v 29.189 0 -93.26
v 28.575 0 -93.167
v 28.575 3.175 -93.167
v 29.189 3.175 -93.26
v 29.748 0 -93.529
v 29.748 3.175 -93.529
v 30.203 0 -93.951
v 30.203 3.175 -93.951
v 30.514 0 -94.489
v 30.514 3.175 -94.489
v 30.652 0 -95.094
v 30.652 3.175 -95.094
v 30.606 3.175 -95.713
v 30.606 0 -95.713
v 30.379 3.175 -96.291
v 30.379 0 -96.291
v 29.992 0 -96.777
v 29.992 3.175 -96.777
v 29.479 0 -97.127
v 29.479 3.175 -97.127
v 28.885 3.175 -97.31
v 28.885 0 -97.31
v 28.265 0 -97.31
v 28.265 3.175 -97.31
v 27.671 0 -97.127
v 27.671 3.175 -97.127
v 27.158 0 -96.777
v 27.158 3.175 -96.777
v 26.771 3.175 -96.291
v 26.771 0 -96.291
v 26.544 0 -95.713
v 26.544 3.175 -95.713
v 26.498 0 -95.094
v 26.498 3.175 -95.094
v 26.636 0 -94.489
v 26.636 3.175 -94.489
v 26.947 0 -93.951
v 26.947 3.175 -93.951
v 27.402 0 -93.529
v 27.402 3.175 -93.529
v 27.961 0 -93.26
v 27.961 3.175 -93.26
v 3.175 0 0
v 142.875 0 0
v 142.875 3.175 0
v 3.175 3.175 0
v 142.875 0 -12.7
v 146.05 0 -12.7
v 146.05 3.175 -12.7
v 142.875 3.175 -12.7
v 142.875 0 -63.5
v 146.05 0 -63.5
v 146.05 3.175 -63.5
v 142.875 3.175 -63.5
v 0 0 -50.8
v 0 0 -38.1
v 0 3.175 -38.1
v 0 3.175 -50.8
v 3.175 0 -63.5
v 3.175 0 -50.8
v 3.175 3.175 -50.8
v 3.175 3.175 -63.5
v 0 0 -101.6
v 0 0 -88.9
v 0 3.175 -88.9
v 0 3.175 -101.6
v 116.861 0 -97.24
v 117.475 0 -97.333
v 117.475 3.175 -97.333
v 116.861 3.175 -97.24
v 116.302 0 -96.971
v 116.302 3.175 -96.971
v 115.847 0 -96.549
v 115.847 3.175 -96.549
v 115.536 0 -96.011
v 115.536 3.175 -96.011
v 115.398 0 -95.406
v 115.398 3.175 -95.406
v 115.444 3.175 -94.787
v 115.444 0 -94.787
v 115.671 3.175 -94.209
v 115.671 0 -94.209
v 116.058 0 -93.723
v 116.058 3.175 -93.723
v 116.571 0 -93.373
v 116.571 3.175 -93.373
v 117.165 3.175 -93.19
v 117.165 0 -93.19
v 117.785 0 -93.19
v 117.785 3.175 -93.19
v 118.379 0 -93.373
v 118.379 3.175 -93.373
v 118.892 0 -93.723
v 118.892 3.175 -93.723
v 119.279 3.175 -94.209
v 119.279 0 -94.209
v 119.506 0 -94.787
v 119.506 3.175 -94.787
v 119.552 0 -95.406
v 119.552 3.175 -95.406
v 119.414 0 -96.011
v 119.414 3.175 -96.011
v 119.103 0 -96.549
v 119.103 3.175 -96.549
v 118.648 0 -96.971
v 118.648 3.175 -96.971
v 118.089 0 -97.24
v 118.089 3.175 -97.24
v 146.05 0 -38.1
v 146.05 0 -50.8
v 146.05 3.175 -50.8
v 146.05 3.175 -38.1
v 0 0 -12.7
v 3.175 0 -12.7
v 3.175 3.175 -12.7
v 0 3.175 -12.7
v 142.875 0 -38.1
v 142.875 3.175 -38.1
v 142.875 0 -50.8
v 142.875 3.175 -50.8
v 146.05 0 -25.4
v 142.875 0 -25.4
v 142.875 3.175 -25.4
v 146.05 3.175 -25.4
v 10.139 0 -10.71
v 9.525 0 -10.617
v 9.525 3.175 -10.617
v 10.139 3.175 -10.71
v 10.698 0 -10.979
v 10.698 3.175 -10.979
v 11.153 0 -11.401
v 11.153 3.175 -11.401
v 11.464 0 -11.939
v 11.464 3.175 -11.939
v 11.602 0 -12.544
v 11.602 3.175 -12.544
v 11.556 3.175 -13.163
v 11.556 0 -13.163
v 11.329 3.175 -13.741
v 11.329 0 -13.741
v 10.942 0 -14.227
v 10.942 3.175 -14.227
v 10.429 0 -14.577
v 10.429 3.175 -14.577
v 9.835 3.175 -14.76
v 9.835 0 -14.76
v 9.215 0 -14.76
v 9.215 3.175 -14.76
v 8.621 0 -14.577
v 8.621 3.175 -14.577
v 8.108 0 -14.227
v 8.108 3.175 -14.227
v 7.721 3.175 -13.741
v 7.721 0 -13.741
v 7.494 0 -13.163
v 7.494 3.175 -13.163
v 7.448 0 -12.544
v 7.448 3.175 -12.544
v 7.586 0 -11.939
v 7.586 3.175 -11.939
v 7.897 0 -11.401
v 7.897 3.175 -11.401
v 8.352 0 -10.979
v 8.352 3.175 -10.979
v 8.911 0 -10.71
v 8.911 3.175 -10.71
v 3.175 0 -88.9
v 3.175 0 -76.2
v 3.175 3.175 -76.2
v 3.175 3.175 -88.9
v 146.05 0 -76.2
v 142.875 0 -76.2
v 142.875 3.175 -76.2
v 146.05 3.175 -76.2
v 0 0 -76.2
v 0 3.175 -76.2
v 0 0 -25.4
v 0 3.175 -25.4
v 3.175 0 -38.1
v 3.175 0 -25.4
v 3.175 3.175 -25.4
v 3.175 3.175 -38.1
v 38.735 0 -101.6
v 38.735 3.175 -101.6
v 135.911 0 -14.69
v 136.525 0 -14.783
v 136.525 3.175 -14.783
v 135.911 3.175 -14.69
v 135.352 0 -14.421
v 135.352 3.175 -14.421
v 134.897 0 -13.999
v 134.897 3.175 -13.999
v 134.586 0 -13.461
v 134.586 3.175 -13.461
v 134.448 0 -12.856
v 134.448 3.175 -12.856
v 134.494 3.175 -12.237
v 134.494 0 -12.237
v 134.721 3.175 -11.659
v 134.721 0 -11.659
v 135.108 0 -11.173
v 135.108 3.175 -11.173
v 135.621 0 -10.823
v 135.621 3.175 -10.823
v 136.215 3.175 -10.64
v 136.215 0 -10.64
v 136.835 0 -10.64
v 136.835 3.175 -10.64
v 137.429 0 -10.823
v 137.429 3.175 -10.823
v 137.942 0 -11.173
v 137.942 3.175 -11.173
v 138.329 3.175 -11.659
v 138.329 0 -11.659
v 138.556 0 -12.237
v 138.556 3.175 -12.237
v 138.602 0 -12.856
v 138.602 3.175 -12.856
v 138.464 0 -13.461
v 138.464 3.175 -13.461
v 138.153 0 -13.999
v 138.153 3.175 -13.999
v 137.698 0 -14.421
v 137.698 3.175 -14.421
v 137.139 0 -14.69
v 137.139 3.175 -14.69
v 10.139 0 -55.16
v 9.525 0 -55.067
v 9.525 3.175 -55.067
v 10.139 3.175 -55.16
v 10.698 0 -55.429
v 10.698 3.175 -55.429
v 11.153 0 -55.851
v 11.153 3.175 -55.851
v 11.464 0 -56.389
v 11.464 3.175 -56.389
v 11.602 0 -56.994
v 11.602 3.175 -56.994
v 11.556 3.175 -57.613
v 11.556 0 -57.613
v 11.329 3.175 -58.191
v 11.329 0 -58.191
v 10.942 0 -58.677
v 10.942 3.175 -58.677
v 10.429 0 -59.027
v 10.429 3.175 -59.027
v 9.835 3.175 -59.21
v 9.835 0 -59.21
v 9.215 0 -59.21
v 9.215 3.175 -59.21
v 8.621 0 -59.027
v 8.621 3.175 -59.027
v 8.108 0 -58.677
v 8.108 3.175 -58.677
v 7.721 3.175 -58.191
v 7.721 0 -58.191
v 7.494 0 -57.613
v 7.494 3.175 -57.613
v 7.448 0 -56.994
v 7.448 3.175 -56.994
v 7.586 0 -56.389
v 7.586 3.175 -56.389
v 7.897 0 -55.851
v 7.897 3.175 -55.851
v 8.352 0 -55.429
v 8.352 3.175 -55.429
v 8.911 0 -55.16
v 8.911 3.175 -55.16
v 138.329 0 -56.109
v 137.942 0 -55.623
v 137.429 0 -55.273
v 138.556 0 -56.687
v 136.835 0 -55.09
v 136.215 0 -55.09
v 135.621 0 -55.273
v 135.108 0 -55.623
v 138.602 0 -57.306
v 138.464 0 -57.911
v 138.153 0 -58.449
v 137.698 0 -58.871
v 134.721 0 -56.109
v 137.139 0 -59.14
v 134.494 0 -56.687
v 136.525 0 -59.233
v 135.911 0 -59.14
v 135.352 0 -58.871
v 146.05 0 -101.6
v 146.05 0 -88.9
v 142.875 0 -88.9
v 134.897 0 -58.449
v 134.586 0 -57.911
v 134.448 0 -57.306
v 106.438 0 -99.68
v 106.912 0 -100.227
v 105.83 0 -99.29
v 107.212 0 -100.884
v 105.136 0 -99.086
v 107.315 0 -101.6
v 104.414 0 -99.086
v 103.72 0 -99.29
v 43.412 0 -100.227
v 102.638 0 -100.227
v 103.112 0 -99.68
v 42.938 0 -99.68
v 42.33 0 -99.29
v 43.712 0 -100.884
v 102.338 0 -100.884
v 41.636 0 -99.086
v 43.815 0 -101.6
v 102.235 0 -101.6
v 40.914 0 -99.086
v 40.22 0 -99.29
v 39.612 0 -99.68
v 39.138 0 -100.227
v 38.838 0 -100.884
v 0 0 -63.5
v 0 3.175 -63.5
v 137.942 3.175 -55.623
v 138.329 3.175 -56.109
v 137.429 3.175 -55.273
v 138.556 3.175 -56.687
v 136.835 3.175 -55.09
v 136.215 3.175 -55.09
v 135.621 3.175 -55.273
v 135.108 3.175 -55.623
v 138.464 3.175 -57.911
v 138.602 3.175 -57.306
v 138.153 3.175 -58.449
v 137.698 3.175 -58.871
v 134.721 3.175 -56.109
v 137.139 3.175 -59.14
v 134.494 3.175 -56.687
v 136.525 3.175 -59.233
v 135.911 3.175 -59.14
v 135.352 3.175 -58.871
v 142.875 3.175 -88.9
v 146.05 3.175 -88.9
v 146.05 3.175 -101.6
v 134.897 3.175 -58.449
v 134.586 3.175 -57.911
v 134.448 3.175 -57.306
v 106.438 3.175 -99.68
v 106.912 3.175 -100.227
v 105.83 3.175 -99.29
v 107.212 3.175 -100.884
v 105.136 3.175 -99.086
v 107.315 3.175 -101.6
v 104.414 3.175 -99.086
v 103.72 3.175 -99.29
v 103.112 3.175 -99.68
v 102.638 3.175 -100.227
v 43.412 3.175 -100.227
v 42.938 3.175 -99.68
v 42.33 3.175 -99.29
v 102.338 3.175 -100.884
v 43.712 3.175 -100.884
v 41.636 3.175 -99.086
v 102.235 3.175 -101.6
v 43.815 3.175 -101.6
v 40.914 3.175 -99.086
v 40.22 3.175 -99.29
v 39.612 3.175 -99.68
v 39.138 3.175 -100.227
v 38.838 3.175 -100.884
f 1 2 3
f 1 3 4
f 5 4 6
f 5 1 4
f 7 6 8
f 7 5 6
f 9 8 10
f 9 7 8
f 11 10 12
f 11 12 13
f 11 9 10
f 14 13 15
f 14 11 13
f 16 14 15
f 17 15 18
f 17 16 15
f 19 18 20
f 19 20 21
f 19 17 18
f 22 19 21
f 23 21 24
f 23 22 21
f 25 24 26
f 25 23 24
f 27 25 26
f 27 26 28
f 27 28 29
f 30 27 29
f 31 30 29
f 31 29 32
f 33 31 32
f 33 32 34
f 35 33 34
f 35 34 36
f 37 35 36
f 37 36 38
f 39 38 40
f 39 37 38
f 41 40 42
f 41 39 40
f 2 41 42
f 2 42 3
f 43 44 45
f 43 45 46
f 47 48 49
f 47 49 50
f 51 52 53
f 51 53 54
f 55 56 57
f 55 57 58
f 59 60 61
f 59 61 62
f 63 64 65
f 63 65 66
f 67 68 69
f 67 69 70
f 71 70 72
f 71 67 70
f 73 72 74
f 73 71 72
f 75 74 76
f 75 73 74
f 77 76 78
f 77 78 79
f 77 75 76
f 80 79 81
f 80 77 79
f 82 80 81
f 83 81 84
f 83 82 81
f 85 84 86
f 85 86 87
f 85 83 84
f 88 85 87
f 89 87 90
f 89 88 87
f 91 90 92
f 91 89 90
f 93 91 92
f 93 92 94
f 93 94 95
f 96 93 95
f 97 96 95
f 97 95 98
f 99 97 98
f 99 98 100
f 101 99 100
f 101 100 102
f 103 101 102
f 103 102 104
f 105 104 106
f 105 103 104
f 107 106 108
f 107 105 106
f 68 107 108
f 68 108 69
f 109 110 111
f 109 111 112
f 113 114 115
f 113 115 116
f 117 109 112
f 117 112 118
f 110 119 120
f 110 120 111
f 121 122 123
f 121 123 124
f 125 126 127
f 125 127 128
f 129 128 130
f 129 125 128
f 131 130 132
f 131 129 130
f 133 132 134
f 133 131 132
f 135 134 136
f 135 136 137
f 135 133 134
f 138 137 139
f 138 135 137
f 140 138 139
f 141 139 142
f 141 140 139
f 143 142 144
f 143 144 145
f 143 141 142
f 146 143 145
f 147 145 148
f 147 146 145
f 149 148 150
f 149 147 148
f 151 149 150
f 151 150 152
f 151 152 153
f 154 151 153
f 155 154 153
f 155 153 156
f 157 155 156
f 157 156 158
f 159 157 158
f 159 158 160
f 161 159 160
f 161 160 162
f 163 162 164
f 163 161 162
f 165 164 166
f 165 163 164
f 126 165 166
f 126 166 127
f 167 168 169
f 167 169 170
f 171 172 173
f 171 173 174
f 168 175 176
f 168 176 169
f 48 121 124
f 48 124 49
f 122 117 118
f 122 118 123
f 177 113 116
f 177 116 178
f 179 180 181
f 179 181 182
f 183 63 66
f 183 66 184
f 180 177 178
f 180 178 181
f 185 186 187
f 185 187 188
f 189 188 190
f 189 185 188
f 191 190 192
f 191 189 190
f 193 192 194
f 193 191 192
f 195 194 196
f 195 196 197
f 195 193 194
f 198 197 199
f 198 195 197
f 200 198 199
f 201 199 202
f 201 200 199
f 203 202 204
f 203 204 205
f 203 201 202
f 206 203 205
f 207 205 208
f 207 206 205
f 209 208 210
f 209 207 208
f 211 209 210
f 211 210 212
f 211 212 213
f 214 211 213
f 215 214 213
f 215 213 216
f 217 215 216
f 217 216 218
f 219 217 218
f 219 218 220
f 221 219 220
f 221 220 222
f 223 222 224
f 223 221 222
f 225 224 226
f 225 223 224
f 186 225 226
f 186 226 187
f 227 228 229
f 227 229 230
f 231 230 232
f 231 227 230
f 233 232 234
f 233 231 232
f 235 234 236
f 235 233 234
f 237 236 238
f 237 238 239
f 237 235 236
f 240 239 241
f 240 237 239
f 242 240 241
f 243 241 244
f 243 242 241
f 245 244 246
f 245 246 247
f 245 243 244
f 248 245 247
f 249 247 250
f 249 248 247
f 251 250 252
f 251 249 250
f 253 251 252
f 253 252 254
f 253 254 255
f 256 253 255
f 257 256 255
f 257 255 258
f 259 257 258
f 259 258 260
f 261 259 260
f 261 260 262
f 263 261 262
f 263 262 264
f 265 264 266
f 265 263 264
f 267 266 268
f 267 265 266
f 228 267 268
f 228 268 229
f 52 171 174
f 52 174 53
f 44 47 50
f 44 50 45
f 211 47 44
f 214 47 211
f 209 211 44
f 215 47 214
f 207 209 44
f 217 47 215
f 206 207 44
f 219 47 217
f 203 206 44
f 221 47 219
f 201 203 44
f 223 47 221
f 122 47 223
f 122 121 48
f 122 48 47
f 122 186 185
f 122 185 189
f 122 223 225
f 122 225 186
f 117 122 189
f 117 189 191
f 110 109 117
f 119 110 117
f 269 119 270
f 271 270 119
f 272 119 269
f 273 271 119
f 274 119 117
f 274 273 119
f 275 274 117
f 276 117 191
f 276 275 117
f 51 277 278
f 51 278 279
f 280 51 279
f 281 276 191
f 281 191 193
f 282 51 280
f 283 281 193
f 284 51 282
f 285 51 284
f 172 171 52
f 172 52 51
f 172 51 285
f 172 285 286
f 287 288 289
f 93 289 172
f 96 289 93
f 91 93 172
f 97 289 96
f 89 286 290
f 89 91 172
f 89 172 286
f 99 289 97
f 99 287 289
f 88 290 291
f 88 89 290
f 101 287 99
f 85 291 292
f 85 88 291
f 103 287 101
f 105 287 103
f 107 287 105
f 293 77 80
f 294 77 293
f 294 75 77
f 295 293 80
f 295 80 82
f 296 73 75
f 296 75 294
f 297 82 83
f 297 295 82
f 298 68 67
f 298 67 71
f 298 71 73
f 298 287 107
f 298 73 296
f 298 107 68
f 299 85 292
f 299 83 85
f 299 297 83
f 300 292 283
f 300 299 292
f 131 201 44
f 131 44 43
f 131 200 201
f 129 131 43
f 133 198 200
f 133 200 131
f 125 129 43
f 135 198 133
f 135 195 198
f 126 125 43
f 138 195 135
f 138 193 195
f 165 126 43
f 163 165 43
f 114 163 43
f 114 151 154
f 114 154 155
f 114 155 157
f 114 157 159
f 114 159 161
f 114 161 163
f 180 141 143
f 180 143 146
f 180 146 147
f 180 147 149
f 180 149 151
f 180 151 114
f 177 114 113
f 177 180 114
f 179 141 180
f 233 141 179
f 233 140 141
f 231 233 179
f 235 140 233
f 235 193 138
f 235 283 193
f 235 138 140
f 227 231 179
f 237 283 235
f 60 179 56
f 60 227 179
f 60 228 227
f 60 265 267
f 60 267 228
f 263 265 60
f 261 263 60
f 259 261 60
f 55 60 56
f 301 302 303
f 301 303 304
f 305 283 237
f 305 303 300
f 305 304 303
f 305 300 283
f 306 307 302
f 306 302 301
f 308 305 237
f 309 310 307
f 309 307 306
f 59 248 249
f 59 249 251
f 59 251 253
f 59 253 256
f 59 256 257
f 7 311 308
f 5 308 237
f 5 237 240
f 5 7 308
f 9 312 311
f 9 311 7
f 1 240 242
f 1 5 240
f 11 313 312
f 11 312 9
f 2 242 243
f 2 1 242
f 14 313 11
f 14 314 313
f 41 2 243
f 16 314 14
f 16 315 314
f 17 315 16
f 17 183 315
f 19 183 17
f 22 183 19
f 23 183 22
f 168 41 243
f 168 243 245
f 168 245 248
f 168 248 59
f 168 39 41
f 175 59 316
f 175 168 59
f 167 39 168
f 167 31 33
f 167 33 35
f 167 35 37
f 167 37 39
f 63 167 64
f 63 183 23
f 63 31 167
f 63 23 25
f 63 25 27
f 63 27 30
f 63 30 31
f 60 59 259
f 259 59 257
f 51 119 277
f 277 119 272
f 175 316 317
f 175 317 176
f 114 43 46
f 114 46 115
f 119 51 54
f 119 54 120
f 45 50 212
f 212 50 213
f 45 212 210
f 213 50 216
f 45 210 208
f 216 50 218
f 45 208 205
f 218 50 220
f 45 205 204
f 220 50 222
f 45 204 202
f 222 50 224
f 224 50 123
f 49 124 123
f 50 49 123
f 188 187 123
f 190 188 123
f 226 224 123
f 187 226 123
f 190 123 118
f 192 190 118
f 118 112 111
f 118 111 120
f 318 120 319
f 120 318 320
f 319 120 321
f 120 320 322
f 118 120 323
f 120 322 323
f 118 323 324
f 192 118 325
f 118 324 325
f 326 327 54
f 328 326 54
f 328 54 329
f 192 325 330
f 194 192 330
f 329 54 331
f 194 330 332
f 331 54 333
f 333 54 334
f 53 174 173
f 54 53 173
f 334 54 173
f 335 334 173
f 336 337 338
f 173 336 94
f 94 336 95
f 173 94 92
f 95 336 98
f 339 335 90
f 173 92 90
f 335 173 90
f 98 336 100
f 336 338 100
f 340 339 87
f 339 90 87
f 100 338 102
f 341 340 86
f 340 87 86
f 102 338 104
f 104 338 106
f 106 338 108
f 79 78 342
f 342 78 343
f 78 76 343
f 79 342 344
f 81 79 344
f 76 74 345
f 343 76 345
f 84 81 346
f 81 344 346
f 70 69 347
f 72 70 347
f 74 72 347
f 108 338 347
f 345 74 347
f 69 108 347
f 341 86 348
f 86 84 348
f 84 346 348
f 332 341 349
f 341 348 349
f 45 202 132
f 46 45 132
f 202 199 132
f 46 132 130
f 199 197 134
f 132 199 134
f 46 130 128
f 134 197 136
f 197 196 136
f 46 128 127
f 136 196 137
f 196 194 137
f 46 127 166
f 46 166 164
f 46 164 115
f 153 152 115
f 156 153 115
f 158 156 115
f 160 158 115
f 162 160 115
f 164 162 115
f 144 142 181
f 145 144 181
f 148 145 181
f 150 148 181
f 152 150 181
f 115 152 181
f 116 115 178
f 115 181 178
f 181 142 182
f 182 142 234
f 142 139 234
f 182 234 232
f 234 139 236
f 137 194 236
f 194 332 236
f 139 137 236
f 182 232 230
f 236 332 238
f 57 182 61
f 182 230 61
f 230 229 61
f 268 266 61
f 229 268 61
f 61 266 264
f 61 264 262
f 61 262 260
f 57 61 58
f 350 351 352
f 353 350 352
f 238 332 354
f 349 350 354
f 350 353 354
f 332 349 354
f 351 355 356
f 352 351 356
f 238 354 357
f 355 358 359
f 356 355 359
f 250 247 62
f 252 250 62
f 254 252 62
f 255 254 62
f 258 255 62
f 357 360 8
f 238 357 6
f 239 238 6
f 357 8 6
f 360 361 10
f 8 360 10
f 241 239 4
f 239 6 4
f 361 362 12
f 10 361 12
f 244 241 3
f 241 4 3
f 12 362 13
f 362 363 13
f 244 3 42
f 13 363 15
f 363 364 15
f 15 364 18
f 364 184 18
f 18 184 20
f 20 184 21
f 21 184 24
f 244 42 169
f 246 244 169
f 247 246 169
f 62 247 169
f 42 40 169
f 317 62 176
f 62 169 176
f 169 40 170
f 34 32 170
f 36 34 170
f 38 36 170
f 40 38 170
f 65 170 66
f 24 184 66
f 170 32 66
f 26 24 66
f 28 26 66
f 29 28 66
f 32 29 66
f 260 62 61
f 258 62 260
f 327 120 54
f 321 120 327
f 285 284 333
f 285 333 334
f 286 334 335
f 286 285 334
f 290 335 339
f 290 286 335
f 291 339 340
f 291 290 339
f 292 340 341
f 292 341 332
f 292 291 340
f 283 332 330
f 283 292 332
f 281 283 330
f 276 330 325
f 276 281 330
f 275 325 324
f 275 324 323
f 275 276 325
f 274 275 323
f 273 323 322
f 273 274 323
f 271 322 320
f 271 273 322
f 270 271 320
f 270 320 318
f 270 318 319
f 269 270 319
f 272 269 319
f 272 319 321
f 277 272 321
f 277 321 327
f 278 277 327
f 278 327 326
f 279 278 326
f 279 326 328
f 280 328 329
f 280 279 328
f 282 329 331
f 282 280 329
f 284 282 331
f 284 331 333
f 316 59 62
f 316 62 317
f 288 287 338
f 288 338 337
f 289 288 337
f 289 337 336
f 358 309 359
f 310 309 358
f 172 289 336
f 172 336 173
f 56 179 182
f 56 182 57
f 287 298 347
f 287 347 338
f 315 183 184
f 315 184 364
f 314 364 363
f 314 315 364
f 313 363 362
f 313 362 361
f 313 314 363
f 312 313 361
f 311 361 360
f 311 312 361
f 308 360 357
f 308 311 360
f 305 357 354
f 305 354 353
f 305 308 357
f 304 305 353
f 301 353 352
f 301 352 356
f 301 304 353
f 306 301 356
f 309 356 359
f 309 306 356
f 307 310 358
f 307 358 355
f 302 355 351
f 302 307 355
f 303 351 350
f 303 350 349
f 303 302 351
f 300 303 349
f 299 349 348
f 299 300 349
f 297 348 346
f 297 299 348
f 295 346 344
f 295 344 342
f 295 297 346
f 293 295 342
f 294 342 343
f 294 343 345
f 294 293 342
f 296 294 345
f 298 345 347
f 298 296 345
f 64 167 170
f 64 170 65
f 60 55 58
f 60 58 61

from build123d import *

# Parameters (mm, degrees)
SKETCH2_R           = 2.0828
BOSS_EXTRUDE1_DEPTH = 3.175


with BuildPart() as part:
    # Sketch2 → Boss-Extrude1 (new body)
    with BuildSketch(Plane(origin=(0, 0, 0), x_dir=(1, 0, 0), z_dir=(0, 1, 0))):
        with BuildLine():
            Line((3.175, 0), (3.175, 12.7))
            Line((3.175, 12.7), (0, 12.7))
            Line((0, 12.7), (0, 25.4))
            Line((0, 25.4), (3.175, 25.4))
            Line((3.175, 25.4), (3.175, 38.1))
            Line((3.175, 38.1), (0, 38.1))
            Line((0, 38.1), (0, 50.8))
            Line((0, 50.8), (3.175, 50.8))
            Line((3.175, 50.8), (3.175, 63.5))
            Line((3.175, 63.5), (0, 63.5))
            Line((0, 63.5), (0, 76.2))
            Line((0, 76.2), (3.175, 76.2))
            Line((3.175, 76.2), (3.175, 88.9))
            Line((3.175, 88.9), (0, 88.9))
            Line((0, 88.9), (0, 101.6))
            Line((0, 101.6), (3.175, 101.6))
            Line((3.175, 101.6), (38.735, 101.6))
            ThreePointArc((38.735, 101.6), (41.275, 99.06), (43.815, 101.6))
            Line((43.815, 101.6), (102.235, 101.6))
            ThreePointArc((102.235, 101.6), (104.775, 99.06), (107.315, 101.6))
            Line((107.315, 101.6), (142.875, 101.6))
            Line((142.875, 101.6), (146.05, 101.6))
            Line((146.05, 101.6), (146.05, 88.9))
            Line((146.05, 88.9), (142.875, 88.9))
            Line((142.875, 88.9), (142.875, 76.2))
            Line((142.875, 76.2), (146.05, 76.2))
            Line((146.05, 76.2), (146.05, 63.5))
            Line((146.05, 63.5), (142.875, 63.5))
            Line((142.875, 63.5), (142.875, 50.8))
            Line((142.875, 50.8), (146.05, 50.8))
            Line((146.05, 50.8), (146.05, 38.1))
            Line((146.05, 38.1), (142.875, 38.1))
            Line((142.875, 38.1), (142.875, 25.4))
            Line((142.875, 25.4), (146.05, 25.4))
            Line((146.05, 25.4), (146.05, 12.7))
            Line((146.05, 12.7), (142.875, 12.7))
            Line((142.875, 12.7), (142.875, 0))
            Line((142.875, 0), (3.175, 0))
        make_face()
        with Locations(Location((136.525, 57.15, 0), (0, 0, 90))):
            Circle(SKETCH2_R, mode=Mode.SUBTRACT)
        with Locations(Location((9.525, 12.7, 0), (0, 0, 270))):
            Circle(SKETCH2_R, mode=Mode.SUBTRACT)
        with Locations(Location((9.525, 57.15, 0), (0, 0, 270))):
            Circle(SKETCH2_R, mode=Mode.SUBTRACT)
        with Locations(Location((136.525, 12.7, 0), (0, 0, 90))):
            Circle(SKETCH2_R, mode=Mode.SUBTRACT)
        with Locations(Location((28.575, 95.25, 0), (0, 0, 270))):
            Circle(SKETCH2_R, mode=Mode.SUBTRACT)
        with Locations(Location((117.475, 95.25, 0), (0, 0, 90))):
            Circle(SKETCH2_R, mode=Mode.SUBTRACT)
    extrude(amount=BOSS_EXTRUDE1_DEPTH)


solid = part.part
